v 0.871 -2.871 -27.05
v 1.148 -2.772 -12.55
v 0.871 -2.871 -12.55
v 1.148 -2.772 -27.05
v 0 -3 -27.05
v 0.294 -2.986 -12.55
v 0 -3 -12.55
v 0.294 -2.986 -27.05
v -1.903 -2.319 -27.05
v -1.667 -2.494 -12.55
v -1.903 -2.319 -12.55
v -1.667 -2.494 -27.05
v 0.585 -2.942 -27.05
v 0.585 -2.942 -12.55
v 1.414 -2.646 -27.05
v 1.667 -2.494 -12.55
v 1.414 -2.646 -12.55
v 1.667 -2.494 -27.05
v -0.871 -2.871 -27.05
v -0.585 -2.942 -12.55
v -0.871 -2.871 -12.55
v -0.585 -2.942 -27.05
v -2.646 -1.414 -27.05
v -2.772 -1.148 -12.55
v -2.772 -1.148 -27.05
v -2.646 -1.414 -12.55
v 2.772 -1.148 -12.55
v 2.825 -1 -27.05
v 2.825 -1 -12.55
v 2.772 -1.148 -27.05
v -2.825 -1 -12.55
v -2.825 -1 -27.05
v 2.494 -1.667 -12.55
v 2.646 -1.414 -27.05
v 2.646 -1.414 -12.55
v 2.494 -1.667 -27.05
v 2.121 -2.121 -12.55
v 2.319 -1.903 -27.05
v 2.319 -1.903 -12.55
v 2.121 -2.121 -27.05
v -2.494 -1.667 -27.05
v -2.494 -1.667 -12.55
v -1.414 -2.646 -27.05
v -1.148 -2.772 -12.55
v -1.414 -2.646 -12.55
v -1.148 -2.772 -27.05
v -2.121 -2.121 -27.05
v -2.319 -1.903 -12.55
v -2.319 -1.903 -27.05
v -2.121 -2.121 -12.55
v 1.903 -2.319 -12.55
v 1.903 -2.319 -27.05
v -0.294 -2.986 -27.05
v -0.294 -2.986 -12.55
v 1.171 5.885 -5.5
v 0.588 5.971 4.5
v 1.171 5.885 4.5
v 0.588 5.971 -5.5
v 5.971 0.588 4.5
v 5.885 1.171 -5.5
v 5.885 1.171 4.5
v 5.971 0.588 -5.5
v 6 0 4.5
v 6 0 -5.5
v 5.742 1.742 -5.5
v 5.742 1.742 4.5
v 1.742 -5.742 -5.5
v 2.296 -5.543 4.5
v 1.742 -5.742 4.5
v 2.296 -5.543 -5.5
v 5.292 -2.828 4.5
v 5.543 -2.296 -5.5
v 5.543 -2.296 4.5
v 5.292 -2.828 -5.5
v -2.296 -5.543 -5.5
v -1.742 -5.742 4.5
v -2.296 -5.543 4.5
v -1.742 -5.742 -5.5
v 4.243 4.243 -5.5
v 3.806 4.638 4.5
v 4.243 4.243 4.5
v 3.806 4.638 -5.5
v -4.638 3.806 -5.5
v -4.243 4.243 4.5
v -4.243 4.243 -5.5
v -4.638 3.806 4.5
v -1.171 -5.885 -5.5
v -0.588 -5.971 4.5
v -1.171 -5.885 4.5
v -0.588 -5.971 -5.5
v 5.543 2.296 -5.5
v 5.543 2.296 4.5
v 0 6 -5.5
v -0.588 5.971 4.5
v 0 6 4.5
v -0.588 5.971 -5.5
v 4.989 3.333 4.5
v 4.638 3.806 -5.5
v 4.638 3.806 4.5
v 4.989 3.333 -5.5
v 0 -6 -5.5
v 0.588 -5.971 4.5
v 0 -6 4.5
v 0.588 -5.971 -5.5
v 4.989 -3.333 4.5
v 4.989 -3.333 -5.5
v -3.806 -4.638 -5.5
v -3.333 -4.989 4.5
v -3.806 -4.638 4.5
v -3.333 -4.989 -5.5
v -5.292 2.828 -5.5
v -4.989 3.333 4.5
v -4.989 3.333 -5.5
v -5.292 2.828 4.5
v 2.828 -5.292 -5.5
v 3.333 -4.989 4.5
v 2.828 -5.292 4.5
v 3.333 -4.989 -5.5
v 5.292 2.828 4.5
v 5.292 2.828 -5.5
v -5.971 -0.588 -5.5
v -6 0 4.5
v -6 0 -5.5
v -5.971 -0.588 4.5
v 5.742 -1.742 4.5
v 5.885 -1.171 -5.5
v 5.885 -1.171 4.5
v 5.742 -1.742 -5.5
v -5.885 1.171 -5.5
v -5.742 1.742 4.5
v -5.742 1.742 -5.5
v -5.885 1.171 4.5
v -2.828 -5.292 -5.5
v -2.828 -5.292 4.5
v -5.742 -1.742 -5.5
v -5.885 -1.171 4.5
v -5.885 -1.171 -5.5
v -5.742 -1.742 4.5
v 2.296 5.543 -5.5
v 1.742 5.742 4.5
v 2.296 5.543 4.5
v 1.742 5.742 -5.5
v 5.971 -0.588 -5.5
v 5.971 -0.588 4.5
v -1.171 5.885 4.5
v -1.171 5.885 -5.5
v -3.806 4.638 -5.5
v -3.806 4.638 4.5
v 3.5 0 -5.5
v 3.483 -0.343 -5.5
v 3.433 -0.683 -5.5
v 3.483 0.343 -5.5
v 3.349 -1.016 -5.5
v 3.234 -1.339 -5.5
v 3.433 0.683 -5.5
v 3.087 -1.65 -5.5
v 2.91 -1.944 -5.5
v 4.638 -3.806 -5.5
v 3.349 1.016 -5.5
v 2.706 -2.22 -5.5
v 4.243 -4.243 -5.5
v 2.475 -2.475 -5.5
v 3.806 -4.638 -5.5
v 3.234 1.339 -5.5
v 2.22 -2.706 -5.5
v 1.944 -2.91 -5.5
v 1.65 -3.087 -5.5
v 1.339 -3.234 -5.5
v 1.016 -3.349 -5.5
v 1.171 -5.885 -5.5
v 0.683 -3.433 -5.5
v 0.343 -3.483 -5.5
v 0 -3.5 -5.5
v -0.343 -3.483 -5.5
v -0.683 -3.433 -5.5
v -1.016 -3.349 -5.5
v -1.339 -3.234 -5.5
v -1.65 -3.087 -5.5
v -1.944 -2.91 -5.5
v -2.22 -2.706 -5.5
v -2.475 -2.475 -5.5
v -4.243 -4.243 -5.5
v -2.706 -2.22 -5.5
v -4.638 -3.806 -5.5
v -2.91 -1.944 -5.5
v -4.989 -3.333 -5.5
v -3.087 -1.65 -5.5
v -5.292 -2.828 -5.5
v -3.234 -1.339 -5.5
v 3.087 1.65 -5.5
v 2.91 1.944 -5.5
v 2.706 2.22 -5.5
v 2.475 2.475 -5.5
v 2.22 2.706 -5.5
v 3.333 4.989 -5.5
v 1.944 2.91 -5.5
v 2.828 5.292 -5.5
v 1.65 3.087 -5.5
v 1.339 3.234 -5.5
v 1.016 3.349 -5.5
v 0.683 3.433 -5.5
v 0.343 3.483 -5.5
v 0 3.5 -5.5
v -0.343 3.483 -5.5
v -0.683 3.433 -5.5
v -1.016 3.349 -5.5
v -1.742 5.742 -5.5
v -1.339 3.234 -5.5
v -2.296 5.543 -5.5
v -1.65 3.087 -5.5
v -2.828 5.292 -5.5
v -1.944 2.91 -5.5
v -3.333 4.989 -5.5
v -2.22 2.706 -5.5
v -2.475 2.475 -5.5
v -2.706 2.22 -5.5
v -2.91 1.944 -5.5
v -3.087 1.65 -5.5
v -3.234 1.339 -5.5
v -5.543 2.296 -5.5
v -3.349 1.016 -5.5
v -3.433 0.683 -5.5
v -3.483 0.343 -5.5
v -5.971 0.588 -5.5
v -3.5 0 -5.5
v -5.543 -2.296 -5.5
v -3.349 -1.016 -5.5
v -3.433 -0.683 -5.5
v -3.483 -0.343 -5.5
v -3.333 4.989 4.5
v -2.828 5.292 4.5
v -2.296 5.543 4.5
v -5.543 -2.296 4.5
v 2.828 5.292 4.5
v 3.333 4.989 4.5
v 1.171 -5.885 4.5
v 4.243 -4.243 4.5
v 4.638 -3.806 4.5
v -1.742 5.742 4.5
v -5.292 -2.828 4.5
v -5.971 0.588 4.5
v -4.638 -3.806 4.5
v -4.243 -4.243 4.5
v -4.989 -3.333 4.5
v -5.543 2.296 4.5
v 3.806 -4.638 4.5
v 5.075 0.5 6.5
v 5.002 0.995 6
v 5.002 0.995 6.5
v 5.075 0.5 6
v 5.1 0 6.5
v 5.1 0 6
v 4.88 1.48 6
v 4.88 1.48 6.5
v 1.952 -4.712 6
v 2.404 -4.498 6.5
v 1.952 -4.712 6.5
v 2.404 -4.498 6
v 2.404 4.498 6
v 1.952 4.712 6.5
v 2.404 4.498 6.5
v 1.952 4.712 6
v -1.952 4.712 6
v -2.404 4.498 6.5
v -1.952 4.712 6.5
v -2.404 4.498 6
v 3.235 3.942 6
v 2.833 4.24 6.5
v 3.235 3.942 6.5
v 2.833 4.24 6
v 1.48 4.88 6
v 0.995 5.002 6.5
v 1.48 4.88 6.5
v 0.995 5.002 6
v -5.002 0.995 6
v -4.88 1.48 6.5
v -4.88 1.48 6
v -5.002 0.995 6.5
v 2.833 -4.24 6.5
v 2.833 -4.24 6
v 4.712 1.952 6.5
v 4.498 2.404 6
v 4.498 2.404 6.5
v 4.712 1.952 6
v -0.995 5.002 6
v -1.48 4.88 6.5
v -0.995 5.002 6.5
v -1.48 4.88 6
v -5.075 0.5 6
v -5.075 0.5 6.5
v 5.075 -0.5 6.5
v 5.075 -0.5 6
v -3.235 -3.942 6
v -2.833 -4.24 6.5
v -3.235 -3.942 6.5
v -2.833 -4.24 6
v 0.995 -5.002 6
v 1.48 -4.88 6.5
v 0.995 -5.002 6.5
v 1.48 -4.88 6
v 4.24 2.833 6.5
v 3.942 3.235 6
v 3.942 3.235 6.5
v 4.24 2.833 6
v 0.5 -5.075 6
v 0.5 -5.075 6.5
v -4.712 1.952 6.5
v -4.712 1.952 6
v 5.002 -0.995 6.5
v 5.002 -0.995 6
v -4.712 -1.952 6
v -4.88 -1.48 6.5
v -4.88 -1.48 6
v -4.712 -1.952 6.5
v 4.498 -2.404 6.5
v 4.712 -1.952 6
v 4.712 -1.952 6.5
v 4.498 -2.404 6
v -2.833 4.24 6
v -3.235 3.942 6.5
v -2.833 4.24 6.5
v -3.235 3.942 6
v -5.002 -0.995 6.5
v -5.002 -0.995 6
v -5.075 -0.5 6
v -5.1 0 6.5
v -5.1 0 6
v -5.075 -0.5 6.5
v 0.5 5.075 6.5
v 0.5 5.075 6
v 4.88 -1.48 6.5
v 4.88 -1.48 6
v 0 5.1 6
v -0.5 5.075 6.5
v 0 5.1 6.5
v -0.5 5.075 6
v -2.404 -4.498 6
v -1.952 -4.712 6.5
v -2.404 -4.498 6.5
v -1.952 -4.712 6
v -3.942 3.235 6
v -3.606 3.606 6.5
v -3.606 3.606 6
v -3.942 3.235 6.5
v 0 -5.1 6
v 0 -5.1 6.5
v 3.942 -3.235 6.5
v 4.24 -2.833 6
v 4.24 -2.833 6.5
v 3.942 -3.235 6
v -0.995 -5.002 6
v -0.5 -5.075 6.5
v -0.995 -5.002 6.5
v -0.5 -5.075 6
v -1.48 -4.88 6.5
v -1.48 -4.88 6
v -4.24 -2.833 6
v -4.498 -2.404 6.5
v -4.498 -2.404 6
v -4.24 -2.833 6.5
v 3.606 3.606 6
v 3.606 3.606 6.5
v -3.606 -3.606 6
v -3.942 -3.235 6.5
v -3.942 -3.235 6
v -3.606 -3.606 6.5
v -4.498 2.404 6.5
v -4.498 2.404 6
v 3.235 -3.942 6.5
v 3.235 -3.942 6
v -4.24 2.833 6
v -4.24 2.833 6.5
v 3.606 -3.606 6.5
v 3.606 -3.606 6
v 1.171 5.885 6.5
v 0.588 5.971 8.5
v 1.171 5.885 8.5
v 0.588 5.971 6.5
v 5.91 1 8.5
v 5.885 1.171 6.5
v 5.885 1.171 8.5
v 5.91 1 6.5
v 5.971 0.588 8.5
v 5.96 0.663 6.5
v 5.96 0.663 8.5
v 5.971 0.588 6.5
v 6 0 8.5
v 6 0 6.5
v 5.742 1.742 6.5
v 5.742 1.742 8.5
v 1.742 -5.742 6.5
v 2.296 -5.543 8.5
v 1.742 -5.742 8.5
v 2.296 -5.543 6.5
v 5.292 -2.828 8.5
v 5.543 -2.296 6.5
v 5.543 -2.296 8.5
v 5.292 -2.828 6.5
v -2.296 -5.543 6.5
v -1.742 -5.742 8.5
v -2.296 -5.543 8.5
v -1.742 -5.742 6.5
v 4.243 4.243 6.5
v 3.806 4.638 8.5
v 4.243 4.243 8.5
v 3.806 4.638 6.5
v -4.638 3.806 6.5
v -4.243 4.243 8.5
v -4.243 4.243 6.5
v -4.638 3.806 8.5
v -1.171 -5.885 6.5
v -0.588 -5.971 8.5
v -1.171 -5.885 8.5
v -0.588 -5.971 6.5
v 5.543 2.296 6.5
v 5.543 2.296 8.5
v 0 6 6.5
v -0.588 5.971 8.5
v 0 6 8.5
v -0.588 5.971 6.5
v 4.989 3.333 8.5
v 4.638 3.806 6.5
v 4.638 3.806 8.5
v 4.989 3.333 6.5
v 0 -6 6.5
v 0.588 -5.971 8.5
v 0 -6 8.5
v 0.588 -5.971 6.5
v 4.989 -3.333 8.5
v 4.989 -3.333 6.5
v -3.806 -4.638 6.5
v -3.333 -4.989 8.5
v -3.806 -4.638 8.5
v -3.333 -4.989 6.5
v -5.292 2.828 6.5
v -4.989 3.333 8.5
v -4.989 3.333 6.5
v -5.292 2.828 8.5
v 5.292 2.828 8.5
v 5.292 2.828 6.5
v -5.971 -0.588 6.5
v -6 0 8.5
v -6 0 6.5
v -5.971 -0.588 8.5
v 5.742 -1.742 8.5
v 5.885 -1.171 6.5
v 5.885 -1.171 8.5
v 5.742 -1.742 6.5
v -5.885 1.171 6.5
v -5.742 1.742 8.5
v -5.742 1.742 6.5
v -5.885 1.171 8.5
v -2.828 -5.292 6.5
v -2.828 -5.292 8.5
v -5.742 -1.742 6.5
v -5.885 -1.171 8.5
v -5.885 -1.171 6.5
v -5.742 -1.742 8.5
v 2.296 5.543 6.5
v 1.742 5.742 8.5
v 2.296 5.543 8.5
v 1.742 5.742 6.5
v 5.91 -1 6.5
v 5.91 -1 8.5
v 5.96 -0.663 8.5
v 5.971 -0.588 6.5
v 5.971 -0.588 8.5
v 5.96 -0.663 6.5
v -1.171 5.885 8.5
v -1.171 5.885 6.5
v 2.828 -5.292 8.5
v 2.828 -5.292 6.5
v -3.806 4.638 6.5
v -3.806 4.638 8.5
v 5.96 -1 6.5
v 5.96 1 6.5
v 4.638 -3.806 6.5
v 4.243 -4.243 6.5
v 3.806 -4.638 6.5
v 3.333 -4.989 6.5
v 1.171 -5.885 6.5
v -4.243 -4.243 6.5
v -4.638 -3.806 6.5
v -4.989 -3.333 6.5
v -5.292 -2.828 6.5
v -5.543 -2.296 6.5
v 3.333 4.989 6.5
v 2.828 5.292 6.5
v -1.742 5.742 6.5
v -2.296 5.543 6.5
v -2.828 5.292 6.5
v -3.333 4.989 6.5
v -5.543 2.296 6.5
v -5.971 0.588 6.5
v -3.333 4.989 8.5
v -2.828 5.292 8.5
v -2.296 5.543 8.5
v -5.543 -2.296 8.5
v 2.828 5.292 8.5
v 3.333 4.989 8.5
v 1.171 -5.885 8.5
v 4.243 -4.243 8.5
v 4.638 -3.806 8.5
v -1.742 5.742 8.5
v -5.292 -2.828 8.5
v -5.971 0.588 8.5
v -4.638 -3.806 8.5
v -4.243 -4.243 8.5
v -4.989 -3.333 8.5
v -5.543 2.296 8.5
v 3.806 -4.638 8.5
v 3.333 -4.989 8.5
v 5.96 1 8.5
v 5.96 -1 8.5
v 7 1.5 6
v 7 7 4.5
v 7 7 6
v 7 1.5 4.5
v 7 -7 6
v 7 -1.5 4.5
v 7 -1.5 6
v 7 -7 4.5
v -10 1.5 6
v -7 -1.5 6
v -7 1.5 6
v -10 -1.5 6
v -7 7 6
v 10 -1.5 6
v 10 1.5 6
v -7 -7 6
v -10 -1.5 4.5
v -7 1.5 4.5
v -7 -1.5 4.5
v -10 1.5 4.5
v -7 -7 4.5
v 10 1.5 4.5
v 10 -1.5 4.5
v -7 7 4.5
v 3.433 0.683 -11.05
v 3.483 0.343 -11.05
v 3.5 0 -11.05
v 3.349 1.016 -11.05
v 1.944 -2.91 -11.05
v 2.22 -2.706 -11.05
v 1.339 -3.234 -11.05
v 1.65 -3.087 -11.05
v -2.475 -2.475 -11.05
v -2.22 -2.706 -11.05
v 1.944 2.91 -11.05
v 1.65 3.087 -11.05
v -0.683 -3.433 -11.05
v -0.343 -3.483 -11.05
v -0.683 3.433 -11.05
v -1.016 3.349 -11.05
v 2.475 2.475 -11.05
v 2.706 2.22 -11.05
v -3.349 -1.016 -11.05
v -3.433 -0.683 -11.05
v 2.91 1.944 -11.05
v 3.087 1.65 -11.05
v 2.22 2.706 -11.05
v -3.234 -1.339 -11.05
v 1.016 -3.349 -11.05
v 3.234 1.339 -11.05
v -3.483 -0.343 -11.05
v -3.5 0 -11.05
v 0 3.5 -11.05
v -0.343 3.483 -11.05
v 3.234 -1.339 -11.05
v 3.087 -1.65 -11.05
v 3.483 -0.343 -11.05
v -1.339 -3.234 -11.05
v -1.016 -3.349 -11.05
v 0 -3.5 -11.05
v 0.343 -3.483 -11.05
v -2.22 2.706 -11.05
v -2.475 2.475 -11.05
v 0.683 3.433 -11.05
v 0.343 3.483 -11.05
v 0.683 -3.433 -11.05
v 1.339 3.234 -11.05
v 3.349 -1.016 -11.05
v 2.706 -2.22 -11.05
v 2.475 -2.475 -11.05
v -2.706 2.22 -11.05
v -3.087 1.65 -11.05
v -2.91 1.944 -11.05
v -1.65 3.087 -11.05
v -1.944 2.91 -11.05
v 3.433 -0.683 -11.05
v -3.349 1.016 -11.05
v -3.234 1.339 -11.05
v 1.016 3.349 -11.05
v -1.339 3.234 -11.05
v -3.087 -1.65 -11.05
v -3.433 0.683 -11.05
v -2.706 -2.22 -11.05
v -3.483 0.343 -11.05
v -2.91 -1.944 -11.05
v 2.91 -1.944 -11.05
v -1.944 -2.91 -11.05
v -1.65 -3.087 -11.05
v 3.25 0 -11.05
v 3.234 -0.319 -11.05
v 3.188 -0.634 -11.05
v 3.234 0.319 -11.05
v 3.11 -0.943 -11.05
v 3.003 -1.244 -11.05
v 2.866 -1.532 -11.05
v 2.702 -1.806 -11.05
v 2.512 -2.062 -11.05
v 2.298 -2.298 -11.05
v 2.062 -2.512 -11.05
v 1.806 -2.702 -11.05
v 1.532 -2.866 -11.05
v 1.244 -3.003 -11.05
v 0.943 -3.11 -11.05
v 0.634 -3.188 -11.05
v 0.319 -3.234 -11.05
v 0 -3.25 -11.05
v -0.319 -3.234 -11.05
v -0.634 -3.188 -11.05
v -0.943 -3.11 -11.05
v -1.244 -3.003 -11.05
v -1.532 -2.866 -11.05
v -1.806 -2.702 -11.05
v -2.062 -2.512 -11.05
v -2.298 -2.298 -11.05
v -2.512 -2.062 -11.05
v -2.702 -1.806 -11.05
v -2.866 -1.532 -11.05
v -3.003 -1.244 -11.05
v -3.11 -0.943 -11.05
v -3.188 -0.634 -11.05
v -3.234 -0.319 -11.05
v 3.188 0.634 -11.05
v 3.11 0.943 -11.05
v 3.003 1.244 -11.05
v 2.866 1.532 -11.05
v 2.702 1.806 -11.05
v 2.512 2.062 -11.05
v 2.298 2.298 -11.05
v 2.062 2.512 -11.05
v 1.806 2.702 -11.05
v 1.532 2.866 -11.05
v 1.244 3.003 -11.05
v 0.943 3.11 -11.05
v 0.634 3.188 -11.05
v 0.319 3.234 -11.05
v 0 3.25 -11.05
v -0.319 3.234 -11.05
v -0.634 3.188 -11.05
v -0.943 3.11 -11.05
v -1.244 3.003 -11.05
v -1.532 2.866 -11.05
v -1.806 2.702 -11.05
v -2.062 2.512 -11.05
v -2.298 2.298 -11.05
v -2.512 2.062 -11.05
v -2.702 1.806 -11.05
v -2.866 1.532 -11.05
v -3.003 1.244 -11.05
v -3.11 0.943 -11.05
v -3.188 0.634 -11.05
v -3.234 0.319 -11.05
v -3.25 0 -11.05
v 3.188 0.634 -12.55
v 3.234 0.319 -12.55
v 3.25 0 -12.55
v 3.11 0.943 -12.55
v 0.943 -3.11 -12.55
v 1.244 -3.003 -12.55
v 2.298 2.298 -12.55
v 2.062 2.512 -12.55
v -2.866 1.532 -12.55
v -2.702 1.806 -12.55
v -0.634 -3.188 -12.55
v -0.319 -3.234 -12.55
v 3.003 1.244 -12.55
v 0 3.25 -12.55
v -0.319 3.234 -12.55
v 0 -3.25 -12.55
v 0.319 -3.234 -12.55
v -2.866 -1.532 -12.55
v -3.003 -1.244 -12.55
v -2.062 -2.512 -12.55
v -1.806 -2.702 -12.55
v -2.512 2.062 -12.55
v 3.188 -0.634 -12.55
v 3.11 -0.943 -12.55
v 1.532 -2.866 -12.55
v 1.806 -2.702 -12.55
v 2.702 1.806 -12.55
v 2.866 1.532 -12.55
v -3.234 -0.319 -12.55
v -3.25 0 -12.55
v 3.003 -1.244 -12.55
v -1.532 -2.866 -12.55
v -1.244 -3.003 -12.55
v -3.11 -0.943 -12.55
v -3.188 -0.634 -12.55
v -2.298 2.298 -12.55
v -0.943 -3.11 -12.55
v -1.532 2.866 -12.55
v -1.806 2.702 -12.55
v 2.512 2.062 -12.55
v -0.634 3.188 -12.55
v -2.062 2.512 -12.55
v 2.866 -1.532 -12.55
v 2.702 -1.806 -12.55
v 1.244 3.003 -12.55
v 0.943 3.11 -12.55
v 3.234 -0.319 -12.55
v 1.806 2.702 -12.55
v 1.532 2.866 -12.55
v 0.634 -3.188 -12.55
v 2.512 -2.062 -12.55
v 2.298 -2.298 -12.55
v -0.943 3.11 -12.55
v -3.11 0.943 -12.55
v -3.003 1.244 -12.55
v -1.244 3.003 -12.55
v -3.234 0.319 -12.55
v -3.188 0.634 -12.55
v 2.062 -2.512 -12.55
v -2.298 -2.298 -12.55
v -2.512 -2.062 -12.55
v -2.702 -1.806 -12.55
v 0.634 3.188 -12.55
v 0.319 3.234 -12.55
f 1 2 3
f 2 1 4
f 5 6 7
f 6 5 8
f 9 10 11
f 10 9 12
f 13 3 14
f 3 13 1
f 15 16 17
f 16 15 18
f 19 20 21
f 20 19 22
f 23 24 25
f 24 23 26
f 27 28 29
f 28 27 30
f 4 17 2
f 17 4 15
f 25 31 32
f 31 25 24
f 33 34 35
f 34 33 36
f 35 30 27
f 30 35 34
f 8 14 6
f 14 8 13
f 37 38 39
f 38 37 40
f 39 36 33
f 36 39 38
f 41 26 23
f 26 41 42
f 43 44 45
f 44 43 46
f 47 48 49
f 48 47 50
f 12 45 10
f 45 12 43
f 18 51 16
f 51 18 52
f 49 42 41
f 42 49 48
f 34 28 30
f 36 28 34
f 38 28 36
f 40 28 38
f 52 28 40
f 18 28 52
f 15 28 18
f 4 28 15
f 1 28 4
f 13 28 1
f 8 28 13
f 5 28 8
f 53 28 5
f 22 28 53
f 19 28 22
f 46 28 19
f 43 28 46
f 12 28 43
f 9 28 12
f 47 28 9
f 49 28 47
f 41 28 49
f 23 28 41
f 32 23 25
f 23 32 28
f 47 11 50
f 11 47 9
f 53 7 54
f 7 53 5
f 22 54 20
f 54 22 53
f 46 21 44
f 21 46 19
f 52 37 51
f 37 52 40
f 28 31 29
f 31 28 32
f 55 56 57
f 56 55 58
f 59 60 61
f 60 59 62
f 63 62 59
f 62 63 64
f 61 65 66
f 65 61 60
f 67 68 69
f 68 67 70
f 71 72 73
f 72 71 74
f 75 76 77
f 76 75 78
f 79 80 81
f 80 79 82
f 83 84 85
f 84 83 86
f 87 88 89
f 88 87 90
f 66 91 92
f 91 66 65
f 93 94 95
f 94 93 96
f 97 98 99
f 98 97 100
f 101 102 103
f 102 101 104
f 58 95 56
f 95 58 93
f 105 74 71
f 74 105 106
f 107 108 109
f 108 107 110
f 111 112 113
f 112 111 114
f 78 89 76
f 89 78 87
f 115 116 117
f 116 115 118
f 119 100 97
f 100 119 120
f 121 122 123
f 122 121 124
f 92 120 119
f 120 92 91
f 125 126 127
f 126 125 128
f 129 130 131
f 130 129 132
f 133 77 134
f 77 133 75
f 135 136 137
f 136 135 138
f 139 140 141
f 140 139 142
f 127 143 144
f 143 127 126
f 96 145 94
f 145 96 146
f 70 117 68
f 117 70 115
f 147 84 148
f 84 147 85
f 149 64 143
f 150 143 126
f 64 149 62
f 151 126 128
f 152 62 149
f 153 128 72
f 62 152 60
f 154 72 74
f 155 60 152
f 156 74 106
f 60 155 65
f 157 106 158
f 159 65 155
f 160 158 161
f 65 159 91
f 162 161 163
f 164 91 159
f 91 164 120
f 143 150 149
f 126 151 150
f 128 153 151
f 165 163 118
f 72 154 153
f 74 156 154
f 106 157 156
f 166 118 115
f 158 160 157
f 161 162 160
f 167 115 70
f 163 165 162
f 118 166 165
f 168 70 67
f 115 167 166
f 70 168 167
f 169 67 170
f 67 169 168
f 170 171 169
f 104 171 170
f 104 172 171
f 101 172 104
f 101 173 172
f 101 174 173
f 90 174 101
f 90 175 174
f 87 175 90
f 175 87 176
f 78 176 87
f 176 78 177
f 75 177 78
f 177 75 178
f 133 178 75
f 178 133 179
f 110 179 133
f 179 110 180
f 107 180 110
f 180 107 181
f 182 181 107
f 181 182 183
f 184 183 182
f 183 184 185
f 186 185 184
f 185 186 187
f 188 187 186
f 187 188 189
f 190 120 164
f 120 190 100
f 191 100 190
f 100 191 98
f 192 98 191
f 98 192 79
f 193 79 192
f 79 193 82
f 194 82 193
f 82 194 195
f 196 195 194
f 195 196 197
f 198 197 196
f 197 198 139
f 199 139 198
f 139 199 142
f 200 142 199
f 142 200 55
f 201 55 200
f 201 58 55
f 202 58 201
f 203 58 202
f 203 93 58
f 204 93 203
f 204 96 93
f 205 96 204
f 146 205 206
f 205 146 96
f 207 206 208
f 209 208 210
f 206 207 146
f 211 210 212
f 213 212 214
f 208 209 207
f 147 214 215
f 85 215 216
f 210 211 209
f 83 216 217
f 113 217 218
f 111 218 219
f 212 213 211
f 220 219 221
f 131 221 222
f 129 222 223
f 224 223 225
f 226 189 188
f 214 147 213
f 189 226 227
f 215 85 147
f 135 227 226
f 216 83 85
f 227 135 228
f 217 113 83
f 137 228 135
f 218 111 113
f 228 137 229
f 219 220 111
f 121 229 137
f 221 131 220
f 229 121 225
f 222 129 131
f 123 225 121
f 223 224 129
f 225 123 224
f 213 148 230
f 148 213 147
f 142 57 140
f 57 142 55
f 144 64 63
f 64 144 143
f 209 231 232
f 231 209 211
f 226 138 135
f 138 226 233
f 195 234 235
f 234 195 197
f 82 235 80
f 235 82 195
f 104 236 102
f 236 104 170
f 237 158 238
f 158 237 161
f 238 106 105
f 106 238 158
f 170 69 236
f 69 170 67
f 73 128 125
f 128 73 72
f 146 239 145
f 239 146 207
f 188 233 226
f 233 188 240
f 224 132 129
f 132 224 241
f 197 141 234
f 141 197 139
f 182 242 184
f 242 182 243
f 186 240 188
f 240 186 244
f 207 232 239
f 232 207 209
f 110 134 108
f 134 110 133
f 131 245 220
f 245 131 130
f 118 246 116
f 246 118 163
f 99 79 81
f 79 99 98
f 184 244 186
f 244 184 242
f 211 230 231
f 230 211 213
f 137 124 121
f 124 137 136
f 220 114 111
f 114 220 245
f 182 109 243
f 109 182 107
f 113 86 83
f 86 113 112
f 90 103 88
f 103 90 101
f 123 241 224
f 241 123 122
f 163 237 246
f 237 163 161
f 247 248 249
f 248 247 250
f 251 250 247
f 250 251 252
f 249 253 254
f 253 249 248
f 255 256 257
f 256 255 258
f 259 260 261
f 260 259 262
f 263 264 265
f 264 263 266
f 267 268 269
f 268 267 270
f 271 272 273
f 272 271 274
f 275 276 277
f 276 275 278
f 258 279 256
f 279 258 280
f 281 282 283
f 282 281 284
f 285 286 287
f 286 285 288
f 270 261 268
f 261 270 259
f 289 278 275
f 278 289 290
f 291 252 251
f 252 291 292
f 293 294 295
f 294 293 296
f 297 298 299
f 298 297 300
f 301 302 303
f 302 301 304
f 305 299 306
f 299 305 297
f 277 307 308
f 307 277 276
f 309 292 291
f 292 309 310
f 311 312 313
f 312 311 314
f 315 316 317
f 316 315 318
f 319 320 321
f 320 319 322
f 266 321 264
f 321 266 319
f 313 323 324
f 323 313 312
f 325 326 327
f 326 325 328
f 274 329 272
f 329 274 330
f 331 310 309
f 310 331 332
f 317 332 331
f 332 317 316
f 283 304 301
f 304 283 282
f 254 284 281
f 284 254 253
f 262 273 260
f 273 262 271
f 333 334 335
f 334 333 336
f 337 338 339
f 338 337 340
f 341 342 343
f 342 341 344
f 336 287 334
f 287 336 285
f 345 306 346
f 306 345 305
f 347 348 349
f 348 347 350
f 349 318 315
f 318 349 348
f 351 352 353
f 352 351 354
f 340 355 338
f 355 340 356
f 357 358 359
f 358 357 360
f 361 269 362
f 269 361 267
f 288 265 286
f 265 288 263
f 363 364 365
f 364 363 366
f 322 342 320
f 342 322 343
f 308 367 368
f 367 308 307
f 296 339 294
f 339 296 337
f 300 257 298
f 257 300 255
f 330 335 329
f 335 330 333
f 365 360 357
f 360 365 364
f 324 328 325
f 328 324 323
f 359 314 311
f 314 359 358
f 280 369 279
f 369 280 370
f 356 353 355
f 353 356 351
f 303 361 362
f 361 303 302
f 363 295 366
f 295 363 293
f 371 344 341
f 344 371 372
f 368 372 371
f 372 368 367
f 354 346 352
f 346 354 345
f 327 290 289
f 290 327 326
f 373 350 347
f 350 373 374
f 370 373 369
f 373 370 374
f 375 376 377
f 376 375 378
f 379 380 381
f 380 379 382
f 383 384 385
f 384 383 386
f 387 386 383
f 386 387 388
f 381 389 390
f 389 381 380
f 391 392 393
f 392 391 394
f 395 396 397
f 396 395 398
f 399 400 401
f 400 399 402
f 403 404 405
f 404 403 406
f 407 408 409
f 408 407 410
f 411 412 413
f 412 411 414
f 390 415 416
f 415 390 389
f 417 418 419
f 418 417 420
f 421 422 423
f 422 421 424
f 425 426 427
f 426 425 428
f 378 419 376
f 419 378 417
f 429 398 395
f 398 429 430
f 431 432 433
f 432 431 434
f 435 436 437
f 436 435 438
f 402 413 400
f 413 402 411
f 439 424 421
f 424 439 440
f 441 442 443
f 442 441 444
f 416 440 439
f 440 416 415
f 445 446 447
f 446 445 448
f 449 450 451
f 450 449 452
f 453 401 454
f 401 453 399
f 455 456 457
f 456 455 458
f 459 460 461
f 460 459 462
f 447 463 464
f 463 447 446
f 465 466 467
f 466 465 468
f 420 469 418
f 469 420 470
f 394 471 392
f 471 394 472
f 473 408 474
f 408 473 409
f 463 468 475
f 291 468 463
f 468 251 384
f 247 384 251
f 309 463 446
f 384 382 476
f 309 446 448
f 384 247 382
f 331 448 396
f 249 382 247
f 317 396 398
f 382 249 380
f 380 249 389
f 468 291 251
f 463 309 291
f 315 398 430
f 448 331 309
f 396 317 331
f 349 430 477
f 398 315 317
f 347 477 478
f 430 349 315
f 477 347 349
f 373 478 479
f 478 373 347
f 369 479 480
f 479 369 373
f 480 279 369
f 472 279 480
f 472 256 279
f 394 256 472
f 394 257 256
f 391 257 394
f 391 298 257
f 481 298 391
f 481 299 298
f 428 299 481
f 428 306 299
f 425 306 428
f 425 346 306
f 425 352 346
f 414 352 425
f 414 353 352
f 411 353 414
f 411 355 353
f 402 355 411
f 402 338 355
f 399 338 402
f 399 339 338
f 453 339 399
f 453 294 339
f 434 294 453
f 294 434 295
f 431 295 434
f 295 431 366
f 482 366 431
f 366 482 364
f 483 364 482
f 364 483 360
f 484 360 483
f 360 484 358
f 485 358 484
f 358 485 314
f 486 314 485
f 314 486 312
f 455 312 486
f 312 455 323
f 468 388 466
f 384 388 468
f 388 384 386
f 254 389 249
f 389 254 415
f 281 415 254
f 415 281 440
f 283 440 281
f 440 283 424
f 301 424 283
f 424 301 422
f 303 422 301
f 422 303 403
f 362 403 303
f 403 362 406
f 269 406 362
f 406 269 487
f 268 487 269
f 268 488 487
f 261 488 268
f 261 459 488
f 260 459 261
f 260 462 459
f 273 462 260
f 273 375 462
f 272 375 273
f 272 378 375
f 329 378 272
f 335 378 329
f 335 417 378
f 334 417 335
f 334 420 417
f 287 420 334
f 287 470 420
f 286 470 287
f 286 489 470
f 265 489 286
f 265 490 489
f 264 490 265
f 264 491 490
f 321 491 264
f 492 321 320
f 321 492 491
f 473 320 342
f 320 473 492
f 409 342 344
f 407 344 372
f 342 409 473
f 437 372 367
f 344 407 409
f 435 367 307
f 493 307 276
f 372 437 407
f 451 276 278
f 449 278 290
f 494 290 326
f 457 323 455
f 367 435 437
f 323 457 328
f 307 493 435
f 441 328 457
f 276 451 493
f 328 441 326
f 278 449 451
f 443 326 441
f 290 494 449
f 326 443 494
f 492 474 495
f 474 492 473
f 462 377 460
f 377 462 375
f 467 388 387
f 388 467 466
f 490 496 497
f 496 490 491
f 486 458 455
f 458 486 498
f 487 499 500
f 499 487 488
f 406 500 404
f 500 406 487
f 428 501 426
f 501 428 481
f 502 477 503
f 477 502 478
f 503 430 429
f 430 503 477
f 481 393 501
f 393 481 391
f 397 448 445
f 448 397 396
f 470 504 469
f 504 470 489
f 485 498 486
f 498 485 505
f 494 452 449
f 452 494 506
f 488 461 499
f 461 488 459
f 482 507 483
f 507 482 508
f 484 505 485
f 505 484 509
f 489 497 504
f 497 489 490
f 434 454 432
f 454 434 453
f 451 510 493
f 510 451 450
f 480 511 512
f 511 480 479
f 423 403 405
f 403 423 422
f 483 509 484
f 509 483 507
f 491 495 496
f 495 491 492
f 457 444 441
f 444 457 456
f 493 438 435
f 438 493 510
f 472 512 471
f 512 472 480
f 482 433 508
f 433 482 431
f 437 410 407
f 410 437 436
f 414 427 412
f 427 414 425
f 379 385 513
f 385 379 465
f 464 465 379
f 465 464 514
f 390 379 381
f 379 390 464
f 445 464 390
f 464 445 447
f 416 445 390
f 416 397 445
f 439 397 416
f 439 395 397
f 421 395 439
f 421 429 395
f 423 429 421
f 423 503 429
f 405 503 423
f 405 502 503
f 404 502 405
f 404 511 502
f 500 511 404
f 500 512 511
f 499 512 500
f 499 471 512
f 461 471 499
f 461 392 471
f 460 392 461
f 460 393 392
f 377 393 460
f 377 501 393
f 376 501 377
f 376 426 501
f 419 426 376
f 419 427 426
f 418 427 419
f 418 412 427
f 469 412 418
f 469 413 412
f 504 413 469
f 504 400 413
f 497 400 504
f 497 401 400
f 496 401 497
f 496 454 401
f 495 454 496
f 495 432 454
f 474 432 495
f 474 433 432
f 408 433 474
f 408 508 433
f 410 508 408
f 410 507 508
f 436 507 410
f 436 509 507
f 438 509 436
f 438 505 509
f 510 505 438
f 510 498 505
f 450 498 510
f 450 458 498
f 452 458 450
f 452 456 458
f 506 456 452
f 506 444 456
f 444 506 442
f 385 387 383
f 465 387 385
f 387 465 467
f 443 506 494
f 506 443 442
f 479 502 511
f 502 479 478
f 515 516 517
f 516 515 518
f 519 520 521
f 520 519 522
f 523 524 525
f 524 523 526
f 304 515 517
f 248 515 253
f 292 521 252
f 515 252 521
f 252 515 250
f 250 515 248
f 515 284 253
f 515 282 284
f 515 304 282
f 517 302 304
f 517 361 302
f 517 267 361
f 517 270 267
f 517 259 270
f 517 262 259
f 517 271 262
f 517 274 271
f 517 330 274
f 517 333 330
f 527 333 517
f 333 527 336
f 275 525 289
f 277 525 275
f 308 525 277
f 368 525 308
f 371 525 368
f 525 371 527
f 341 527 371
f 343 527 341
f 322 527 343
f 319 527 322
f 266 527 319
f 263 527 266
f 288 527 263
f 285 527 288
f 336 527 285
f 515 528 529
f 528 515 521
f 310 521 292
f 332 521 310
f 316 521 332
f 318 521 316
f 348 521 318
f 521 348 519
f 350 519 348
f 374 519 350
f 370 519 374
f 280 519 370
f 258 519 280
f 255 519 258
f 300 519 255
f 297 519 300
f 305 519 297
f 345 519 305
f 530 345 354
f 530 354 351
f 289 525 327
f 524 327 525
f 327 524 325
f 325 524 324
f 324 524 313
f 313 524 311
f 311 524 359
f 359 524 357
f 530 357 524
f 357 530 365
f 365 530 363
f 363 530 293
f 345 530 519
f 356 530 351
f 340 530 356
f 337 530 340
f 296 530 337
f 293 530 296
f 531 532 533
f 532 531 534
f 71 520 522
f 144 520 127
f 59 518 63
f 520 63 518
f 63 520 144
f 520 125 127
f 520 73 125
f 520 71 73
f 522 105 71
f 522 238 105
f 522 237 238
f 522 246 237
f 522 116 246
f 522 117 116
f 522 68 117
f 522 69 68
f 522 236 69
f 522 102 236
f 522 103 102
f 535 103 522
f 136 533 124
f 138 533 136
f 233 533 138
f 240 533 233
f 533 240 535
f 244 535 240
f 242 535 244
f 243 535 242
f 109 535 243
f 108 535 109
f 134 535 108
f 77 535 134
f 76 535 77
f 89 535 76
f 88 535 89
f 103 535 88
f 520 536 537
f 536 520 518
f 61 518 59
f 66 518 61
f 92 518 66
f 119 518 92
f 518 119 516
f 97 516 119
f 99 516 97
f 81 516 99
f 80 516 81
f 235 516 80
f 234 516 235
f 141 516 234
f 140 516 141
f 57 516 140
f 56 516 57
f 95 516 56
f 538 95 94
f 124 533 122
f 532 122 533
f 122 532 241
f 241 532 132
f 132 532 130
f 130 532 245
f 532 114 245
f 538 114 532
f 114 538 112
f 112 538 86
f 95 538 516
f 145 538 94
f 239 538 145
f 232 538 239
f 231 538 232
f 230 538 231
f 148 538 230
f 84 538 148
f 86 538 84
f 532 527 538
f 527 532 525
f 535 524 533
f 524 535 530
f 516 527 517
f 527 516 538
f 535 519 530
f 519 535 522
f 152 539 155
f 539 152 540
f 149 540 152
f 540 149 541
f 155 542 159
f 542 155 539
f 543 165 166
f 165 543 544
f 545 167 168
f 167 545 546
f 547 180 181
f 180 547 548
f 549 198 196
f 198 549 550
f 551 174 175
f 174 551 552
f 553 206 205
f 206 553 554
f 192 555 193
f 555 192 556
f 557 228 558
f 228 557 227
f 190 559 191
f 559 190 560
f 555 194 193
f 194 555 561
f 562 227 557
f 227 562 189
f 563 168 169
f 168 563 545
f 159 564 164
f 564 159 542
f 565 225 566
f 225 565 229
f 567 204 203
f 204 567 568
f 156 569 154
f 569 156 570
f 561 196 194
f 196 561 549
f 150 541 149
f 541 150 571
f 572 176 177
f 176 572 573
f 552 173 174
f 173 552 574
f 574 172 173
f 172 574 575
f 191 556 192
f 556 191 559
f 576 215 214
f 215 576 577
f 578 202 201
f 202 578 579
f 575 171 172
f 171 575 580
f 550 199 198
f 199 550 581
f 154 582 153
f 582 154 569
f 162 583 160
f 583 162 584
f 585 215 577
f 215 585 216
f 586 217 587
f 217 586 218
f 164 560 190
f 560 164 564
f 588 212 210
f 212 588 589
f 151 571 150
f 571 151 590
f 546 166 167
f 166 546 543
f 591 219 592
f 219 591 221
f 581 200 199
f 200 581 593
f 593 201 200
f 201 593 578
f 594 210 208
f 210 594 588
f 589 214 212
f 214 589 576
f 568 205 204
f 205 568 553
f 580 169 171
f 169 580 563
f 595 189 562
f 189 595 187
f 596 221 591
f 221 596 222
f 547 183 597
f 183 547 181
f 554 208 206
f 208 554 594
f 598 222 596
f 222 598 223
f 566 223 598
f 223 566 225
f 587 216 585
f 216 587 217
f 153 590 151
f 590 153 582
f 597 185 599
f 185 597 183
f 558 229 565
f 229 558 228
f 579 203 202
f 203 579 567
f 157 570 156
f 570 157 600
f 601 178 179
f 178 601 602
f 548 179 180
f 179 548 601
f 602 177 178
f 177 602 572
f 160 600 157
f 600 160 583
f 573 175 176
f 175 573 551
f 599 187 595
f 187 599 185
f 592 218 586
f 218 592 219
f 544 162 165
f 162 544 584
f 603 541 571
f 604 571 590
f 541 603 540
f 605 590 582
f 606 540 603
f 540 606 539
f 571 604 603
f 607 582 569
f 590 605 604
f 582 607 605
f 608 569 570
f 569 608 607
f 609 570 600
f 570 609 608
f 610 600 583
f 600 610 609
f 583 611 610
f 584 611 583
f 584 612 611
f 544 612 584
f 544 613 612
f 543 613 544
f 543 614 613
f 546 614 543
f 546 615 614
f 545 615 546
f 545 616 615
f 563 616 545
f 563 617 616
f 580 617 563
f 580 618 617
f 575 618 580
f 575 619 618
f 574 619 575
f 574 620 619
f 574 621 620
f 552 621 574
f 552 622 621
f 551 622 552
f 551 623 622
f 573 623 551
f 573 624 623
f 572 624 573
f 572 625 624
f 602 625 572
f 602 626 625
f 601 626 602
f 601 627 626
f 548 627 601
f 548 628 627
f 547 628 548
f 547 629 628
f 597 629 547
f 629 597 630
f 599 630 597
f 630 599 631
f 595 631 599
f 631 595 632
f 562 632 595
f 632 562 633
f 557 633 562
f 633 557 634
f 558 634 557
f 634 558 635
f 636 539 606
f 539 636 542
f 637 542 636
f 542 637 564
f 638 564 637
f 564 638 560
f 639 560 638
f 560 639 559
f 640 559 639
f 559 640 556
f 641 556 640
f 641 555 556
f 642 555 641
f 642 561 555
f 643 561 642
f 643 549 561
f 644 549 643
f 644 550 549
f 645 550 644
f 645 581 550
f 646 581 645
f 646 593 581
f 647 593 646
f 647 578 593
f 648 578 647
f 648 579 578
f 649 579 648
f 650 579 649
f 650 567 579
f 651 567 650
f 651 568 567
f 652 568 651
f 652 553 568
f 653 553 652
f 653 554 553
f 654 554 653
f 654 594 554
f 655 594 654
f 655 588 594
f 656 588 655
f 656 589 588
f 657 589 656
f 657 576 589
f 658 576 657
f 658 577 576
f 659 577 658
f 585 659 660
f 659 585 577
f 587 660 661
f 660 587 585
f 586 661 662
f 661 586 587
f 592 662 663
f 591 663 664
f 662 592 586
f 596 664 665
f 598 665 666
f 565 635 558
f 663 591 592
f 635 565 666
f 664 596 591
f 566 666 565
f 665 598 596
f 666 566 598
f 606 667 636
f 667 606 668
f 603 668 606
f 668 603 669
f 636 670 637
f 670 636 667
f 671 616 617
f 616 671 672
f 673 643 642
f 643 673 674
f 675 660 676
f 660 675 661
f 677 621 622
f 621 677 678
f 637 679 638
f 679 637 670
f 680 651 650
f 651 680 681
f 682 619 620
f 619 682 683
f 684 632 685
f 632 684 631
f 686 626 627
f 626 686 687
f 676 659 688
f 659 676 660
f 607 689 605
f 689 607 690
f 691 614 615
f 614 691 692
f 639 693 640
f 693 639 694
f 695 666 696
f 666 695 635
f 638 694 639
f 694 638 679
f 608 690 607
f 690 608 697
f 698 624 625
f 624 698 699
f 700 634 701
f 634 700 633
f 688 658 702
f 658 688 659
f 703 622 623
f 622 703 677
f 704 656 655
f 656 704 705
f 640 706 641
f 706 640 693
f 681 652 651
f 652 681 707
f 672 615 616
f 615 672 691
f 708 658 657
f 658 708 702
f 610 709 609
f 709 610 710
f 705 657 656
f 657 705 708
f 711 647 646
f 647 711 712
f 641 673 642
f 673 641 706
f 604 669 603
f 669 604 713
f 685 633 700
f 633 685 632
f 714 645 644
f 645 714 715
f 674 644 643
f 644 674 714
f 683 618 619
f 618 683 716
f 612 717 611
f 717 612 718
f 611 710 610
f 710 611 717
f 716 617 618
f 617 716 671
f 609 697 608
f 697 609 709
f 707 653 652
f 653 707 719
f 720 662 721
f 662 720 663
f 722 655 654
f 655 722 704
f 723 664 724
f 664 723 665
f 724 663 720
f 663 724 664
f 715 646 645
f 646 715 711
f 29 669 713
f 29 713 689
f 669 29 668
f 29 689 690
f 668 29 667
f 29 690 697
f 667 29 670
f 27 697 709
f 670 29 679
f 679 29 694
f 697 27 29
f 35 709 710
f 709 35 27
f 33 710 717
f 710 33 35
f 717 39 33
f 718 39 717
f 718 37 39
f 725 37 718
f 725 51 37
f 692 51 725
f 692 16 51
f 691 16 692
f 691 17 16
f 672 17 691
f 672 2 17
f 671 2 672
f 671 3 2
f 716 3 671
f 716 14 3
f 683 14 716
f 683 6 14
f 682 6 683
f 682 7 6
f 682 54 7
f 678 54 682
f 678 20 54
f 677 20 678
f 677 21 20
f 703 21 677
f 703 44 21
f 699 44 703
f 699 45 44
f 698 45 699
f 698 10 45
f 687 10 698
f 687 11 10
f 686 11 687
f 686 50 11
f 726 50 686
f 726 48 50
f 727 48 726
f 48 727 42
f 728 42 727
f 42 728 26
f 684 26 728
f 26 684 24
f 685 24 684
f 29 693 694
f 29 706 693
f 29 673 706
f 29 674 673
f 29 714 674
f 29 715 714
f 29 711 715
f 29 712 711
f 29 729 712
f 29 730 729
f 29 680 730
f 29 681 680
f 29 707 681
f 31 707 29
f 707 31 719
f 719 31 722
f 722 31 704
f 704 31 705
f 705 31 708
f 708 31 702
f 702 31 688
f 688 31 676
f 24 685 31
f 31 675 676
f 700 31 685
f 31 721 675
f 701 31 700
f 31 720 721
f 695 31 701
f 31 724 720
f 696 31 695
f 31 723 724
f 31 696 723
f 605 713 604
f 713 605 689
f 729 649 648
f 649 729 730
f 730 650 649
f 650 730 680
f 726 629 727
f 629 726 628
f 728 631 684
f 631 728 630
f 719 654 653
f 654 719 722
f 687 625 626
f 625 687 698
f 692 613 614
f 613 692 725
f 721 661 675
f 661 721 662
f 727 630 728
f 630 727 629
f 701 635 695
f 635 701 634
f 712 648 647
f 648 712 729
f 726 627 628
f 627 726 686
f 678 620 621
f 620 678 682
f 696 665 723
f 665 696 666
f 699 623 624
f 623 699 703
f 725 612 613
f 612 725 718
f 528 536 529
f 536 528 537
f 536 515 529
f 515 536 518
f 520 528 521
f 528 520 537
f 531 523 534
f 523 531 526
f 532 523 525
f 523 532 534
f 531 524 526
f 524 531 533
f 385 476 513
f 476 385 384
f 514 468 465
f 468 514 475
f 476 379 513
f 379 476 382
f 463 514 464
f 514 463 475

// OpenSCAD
// Parameters (match: A potentiometer: [12, 11, 6, 0.5])
type_0 = 12; //[6:24:1]
type_1 = 11; //[6:22:1]
type_2 = 6;  //[3:12:1]
type_3 = 0.5;//[0.25:2:0.25]

eps = 0.5;   //[0.25:2:0.25]  // overlap amount to guarantee connectivity

// Primary dims driven by the 4-tuple
body_d   = type_0;   // 12
body_h   = type_1;   // 11
shaft_d  = type_2;   // 6
detail_t = type_3;   // 0.5

// Derived/secondary dims (kept proportional and connected)
boss_d = body_d * 0.85;
boss_h = max(2, body_h * 0.18);

wafer_d = body_d;
wafer_t = max(2, body_h * 0.18);

face_plate_w = body_d + 2;
face_plate_h = body_d + 2;
face_plate_t = max(1.5, 3*detail_t);

thread_d = max(shaft_d + 1, body_d * 0.58);
thread_h = max(6, body_h * 0.55);

shaft_neck_d = shaft_d + 0.5;
shaft_neck_h = max(2, body_h * 0.18);

shaft_length = max(15, body_h * 1.35);
shaft_flat_depth = 1;

tab_w = max(3, body_d * 0.25);
tab_l = max(4, body_d * 0.33);
tab_t = max(1.5, 3*detail_t);

spigot_w = max(4, body_d * 0.33);
spigot_h = max(2, body_h * 0.18);
spigot_t = max(2, body_h * 0.18);
spigot_x_offset = body_d * 0.33;

$fn = 64;

// Potentiometer - ONE connected solid
module potentiometer() {
  union() {

    // Body centered at z=0
    cylinder(r=body_d/2, h=body_h, center=true);

    // Boss on top of body (overlap into body)
    translate([0, 0, body_h/2 + boss_h/2 - eps])
      cylinder(r=boss_d/2, h=boss_h, center=true);

    // Wafer above boss (overlap into boss)
    translate([0, 0, body_h/2 + boss_h + wafer_t/2 - 2*eps])
      cylinder(r=wafer_d/2, h=wafer_t, center=true);

    // Face plate at top of body (overlap into body)
    translate([0, 0, body_h/2 - face_plate_t/2 + eps])
      cube([face_plate_w, face_plate_h, face_plate_t], center=true);

    // Threaded bushing below body (overlap into body)
    translate([0, 0, -body_h/2 - thread_h/2 + eps])
      cylinder(r=thread_d/2, h=thread_h, center=true);

    // Shaft neck below thread (overlap into thread)
    translate([0, 0, -body_h/2 - thread_h - shaft_neck_h/2 + 2*eps])
      cylinder(r=shaft_neck_d/2, h=shaft_neck_h, center=true);

    // Shaft with flat below neck (overlap into neck)
    difference() {
      translate([0, 0, -body_h/2 - thread_h - shaft_neck_h - shaft_length/2 + 3*eps])
        cylinder(r=shaft_d/2, h=shaft_length, center=true);

      translate([0, shaft_d/2 - shaft_flat_depth,
                 -body_h/2 - thread_h - shaft_neck_h - shaft_length/2 + 3*eps])
        cube([shaft_d*1.2, shaft_d, shaft_length*1.1], center=true);
    }

    // Mounting tabs: ensure they intersect the face plate (not just touch)
    translate([face_plate_w/2 + tab_l/2 - 2*eps, 0, body_h/2 - face_plate_t/2 + eps])
      cube([tab_l, tab_w, tab_t], center=true);

    translate([-(face_plate_w/2 + tab_l/2 - 2*eps), 0, body_h/2 - face_plate_t/2 + eps])
      cube([tab_l, tab_w, tab_t], center=true);

    // Spigot on wafer edge (overlap into wafer)
    translate([spigot_x_offset, 0, body_h/2 + boss_h + wafer_t/2 - 2*eps])
      cube([spigot_w, spigot_h, spigot_t], center=true);
  }
}

potentiometer();
